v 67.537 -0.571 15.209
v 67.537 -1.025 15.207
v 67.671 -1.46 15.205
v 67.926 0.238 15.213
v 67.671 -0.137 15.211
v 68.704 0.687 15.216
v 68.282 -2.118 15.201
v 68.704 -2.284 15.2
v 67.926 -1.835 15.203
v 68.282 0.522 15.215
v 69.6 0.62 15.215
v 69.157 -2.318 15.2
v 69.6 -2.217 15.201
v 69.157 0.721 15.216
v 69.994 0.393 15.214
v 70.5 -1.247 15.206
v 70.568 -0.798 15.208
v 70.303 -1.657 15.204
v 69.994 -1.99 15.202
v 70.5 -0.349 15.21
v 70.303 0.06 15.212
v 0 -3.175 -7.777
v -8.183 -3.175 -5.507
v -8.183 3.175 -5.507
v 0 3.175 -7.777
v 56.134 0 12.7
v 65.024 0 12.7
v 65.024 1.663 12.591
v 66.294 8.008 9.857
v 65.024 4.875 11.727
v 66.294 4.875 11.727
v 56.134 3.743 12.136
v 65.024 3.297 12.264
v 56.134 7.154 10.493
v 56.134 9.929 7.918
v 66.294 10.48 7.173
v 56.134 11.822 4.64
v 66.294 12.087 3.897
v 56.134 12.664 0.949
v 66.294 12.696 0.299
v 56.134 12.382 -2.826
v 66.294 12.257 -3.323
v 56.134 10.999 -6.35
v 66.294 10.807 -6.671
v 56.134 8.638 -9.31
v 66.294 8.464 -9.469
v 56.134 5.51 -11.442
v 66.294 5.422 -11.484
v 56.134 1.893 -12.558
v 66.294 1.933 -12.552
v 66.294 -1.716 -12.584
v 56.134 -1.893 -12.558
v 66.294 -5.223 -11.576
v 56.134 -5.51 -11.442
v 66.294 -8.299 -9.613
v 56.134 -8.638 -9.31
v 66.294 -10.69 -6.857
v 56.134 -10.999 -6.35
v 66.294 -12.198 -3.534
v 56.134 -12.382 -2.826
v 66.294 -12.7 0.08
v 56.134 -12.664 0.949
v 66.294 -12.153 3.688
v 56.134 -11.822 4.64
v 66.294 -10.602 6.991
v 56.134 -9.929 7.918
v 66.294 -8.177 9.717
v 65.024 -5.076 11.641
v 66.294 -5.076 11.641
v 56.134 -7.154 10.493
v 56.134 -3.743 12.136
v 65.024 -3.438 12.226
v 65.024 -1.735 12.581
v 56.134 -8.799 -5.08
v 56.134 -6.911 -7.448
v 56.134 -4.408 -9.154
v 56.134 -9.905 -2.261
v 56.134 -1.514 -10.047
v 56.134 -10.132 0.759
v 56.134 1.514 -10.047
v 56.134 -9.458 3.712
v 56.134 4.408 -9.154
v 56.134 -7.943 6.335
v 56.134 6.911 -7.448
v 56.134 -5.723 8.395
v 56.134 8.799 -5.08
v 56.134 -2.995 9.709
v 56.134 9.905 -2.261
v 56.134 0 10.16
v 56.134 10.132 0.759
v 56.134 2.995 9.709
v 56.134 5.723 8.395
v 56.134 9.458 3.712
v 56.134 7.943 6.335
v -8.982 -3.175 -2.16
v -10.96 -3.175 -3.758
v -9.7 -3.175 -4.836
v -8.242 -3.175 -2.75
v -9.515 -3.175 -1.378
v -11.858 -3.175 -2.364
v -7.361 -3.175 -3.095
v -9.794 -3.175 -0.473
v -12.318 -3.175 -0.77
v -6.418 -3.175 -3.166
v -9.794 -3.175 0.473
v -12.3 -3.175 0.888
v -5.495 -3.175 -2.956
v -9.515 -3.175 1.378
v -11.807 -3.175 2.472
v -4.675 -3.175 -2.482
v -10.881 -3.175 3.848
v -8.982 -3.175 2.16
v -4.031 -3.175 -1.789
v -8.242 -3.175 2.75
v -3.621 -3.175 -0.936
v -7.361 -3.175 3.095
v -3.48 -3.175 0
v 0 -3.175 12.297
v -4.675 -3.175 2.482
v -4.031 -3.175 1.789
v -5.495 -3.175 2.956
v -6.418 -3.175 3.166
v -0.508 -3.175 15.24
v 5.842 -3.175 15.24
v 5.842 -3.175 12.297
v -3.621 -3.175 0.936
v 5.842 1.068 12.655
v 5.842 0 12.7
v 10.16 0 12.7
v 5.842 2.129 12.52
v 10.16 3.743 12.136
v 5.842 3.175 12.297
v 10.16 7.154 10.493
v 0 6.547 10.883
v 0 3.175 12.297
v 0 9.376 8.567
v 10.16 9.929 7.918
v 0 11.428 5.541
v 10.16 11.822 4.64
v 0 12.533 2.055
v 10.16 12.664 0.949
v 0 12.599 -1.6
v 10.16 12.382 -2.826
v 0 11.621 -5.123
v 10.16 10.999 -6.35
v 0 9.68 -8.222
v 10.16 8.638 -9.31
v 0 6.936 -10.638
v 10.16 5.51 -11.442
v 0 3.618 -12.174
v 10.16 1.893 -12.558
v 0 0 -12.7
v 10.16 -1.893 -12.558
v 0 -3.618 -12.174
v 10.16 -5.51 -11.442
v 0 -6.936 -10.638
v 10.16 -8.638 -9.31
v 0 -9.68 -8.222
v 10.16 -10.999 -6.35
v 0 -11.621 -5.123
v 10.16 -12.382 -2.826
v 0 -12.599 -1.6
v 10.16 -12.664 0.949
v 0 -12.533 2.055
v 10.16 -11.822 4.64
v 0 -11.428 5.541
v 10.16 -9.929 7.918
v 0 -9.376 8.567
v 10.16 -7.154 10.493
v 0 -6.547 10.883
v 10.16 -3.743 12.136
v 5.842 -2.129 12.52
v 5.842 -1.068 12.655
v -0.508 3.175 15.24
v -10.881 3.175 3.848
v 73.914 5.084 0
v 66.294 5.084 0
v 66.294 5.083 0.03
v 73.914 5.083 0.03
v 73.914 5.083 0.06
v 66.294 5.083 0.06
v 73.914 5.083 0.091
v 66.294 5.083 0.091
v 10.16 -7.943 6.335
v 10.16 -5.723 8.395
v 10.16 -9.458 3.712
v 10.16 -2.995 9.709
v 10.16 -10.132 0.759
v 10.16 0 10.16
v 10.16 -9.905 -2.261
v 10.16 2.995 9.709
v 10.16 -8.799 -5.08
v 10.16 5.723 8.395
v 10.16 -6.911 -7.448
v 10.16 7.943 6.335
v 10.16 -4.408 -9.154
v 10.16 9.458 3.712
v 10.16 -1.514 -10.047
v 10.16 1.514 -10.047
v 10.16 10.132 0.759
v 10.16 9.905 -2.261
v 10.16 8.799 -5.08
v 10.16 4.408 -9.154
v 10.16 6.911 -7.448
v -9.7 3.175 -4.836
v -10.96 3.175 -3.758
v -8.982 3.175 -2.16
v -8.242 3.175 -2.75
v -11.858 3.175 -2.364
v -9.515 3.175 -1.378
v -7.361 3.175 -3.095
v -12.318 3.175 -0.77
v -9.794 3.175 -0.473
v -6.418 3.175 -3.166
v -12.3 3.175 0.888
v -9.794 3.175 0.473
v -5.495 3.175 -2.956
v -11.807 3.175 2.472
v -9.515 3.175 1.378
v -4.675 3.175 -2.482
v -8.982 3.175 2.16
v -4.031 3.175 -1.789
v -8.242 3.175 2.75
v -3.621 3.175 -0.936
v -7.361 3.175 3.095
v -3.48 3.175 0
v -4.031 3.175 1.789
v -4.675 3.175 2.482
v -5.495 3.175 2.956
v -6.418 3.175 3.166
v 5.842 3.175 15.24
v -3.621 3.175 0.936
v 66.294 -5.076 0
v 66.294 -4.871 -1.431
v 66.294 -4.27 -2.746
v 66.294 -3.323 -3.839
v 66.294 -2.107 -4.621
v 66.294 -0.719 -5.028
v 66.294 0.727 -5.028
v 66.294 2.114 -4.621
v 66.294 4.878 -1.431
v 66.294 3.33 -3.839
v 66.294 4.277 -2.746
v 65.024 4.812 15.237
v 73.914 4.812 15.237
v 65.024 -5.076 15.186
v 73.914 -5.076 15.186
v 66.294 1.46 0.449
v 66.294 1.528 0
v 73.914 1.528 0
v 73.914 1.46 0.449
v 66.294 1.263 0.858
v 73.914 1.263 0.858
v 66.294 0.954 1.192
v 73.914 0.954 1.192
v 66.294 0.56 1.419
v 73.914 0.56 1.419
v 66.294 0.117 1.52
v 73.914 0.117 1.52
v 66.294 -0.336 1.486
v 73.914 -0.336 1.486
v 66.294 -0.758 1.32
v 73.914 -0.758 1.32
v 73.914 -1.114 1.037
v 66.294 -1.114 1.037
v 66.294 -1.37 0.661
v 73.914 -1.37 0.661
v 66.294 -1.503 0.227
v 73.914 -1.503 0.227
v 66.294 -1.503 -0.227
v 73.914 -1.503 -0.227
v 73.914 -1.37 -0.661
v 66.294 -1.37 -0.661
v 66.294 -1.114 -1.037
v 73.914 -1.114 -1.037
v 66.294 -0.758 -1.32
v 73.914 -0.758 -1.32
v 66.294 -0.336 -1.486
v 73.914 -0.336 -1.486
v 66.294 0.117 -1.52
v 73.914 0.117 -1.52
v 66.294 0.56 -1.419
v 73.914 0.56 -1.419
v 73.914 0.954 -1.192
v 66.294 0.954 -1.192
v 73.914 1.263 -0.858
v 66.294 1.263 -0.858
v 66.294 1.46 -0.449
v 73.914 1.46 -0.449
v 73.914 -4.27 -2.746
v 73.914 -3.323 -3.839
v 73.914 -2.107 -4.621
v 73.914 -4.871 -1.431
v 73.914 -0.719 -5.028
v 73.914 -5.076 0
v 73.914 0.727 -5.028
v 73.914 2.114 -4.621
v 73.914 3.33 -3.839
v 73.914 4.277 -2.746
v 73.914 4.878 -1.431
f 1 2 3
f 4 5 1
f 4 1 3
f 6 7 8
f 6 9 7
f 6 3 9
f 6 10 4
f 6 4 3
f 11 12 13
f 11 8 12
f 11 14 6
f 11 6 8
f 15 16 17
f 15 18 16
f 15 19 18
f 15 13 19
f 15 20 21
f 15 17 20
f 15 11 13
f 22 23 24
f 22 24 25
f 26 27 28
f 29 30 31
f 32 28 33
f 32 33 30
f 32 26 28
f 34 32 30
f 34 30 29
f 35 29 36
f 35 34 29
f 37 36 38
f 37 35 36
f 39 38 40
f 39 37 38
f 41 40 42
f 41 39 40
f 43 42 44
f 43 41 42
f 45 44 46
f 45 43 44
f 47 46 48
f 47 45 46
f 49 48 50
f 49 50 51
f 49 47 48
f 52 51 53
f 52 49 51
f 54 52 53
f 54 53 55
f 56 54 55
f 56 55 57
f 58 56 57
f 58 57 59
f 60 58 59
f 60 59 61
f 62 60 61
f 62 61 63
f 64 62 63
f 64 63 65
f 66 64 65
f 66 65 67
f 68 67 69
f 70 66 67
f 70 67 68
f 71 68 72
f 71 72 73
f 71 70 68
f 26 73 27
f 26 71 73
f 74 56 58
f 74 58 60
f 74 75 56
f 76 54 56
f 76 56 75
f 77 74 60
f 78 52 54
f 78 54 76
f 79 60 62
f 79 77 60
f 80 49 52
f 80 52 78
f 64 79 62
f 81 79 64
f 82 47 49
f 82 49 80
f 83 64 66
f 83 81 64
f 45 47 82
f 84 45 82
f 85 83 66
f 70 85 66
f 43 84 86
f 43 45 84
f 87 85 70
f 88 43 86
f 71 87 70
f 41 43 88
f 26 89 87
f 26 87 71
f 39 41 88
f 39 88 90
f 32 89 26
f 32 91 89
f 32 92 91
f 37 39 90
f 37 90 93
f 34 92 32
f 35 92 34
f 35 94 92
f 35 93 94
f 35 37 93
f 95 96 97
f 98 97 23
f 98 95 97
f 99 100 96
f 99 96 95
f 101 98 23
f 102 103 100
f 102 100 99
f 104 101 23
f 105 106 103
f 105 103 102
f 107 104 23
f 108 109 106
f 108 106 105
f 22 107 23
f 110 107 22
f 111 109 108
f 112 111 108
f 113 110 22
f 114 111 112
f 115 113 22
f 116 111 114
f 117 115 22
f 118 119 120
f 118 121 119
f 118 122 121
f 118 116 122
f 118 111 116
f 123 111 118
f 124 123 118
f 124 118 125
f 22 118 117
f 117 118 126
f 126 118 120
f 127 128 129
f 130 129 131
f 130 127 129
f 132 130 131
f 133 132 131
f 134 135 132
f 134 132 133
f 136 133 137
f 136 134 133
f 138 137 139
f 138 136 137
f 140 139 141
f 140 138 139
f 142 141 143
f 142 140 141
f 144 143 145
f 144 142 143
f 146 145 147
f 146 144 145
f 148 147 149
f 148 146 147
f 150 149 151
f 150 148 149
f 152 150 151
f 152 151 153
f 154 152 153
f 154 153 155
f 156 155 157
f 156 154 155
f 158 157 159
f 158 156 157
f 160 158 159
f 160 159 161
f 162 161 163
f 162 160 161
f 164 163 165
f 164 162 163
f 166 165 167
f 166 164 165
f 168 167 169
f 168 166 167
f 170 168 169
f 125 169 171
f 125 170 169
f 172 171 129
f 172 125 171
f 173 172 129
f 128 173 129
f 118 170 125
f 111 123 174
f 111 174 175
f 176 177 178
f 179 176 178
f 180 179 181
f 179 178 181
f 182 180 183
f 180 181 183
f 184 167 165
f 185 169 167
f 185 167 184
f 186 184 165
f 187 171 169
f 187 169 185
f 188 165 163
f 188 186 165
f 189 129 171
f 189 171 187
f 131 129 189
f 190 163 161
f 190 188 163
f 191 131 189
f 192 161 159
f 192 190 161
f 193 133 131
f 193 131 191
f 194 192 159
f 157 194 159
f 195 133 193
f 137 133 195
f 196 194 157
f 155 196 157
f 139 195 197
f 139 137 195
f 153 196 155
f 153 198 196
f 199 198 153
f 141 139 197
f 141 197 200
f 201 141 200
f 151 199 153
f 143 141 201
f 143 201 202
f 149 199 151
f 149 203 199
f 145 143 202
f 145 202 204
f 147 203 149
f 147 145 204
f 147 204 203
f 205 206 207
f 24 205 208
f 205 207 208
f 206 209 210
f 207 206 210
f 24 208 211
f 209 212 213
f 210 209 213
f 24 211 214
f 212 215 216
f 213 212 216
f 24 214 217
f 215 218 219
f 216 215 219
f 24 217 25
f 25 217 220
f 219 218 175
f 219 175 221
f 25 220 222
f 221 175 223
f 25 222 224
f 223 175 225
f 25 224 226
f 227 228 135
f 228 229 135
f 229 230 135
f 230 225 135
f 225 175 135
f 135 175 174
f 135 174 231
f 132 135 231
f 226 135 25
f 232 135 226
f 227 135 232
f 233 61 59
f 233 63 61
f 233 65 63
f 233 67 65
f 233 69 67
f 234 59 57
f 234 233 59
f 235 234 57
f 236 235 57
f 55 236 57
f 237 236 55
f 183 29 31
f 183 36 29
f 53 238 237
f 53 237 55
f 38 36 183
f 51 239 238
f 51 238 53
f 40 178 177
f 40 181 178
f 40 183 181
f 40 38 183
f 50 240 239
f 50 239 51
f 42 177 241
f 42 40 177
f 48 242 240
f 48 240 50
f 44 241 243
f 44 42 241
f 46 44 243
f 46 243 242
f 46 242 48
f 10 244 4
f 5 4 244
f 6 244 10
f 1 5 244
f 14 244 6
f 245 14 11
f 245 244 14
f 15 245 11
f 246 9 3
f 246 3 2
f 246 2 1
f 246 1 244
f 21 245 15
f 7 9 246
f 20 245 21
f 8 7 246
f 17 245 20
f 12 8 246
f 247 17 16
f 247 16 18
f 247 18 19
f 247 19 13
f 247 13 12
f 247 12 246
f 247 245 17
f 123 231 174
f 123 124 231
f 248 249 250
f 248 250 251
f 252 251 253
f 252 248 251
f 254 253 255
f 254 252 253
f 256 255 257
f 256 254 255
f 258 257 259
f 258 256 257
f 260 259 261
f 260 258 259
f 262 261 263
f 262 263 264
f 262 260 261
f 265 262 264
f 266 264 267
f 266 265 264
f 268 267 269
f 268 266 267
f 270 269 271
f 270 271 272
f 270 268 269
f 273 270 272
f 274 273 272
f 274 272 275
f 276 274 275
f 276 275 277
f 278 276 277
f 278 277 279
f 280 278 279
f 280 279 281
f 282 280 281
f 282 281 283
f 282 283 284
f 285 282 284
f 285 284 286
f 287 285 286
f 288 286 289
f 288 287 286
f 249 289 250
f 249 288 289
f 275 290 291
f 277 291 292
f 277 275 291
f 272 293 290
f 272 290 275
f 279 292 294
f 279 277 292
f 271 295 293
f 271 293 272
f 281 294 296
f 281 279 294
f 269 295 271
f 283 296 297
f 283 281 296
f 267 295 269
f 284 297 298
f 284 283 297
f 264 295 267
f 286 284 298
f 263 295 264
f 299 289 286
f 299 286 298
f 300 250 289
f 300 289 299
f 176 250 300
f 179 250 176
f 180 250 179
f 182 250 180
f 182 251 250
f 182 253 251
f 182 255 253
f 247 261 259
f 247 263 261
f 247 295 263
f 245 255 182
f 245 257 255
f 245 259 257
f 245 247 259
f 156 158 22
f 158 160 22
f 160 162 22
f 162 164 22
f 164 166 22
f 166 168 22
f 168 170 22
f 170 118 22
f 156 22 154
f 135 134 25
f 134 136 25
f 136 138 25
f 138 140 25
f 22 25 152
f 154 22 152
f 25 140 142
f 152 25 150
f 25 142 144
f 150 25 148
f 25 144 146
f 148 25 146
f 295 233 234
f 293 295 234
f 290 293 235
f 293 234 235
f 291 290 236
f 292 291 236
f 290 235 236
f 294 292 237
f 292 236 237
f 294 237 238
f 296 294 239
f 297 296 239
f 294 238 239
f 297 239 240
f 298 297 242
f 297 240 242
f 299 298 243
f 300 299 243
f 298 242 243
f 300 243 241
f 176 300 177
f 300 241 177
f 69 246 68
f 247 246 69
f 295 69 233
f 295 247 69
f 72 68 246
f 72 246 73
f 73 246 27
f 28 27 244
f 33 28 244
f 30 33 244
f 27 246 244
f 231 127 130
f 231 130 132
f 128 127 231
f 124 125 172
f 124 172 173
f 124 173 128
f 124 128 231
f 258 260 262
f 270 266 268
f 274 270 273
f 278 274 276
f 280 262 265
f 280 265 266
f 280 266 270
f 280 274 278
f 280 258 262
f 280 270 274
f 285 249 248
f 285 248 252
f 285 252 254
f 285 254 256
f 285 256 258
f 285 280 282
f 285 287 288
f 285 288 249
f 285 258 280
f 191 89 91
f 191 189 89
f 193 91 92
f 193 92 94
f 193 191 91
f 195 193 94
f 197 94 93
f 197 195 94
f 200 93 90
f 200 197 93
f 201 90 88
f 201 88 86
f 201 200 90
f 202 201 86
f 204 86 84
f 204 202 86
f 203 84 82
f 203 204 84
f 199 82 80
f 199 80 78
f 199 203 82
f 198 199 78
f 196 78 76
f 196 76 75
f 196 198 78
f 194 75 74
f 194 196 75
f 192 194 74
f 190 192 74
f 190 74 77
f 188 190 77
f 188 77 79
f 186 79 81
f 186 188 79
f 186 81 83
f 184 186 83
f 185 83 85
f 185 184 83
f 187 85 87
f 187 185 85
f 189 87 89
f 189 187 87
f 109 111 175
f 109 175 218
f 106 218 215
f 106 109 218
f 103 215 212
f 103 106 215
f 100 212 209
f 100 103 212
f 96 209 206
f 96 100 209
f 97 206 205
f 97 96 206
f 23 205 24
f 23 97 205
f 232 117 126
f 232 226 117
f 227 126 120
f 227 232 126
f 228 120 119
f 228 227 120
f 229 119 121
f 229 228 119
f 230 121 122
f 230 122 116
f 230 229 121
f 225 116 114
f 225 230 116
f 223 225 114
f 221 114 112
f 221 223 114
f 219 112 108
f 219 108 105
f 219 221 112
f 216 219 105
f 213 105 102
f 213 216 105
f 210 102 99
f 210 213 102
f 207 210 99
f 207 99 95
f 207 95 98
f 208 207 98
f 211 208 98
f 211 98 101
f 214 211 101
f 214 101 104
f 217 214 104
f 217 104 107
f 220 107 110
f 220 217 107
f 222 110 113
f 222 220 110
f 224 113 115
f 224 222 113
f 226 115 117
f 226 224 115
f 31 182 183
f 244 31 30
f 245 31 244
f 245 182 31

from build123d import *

# Parameters (mm, degrees)
F0_W          = 5.842
F0_H          = 12.7
F0_R          = 3.175
F2_DEPTH      = 3.175
F4_R          = 1.524
F5_DEPTH      = 7.62
F5_DEPTH_BACK = 1.27
F6_R          = 1.524
F7_DEPTH      = 9.69487
F8_R          = 1.524
F9_DEPTH      = 6.87652


with BuildPart() as f1:
    # F0 (on Front) → F1 (revolve)
    with BuildSketch(Plane.XZ):
        Polygon((5.842, 12.7), (5.842, 0), (66.294, 0), (66.294, 12.7), (56.134, 12.7), (56.134, 10.16), (10.16, 10.16), (10.16, 12.7), align=None)
        with Locations((2.921, 6.35)):
            Rectangle(F0_W, F0_H)
    revolve(axis=Axis((33.147, 0, 0), (-1, 0, 0)))

    # F0 (on Front) → F2 (join, symmetric)
    with BuildSketch(Plane.XZ):
        with BuildLine():
            Line((-0.9398, 0), (0, 0))
            Line((0, 0), (0, 12.7))
            Line((0, 12.7), (5.842, 12.7))
            Line((5.842, 12.7), (5.842, 15.24))
            Line((5.842, 15.24), (-0.508, 15.24))
            Line((-0.508, 15.24), (-10.88063, 3.847543))
            ThreePointArc((-10.88063, 3.847543), (-4.591961, 5.329721), (-0.9398, 0))
        make_face()
        with BuildLine():
            ThreePointArc((-8.182663, -5.506983), (-3.195791, -4.549339), (-0.9398, 0))
            ThreePointArc((-0.9398, 0), (-4.591961, 5.329721), (-10.88063, 3.847543))
            ThreePointArc((-10.88063, 3.847543), (-12.145978, -1.583727), (-8.182663, -5.506983))
        make_face()
        with Locations((-6.6548, 0)):
            Circle(F0_R, mode=Mode.SUBTRACT)
        with BuildLine():
            Line((5.842, 0), (0, 0))
            Line((0, 0), (-0.9398, 0))
            ThreePointArc((-0.9398, 0), (-3.195791, -4.549339), (-8.182663, -5.506983))
            Line((-8.182663, -5.506983), (5.842, -9.398))
            Line((5.842, -9.398), (5.842, 0))
        make_face()
        with Locations((2.921, 6.35)):
            Rectangle(F0_W, F0_H)
    extrude(amount=F2_DEPTH, both=True)

    # F4 (on face) → F5 (join, two sides)
    with BuildSketch(Plane.YZ.offset(66.294)) as f5_sk:
        with BuildLine():
            ThreePointArc((-5.076443, 0), (0.003557, -5.08), (5.083557, 0))
            ThreePointArc((5.083557, 0), (5.083354, 0.045348), (5.082747, 0.090693))
            ThreePointArc((5.082747, 0.090693), (-0.041792, 5.079798), (-5.076443, 0))
        make_face()
        with Locations((0.003557, 0)):
            Circle(F4_R, mode=Mode.SUBTRACT)
        with BuildLine():
            ThreePointArc((-5.076443, 0), (-0.041792, 5.079798), (5.082747, 0.090693))
            Line((5.082747, 0.090693), (4.812307, 15.236546))
            Line((4.812307, 15.236546), (-5.076443, 15.186192))
            Line((-5.076443, 15.186192), (-5.076443, 0))
        make_face()
    extrude(amount=F5_DEPTH)
    extrude(f5_sk.sketch, amount=-F5_DEPTH_BACK)

    # F6 (on face) → F7 (join)
    with BuildSketch(Plane(origin=(0, -0.077459, 15.211647), x_dir=(1, 0, 0), z_dir=(0, -0.005092, 0.999987))):
        with Locations((69.043599, -0.720831)):
            Circle(F6_R)
    extrude(amount=-F7_DEPTH)

    # F8 (on face) → F9 (join)
    with BuildSketch(Plane(origin=(0, -0.077459, 15.211647), x_dir=(1, 0, 0), z_dir=(0, -0.005092, 0.999987))):
        with Locations((69.499604, 0.040541)):
            Circle(F8_R)
    extrude(amount=-F9_DEPTH)


solid = f1.part
